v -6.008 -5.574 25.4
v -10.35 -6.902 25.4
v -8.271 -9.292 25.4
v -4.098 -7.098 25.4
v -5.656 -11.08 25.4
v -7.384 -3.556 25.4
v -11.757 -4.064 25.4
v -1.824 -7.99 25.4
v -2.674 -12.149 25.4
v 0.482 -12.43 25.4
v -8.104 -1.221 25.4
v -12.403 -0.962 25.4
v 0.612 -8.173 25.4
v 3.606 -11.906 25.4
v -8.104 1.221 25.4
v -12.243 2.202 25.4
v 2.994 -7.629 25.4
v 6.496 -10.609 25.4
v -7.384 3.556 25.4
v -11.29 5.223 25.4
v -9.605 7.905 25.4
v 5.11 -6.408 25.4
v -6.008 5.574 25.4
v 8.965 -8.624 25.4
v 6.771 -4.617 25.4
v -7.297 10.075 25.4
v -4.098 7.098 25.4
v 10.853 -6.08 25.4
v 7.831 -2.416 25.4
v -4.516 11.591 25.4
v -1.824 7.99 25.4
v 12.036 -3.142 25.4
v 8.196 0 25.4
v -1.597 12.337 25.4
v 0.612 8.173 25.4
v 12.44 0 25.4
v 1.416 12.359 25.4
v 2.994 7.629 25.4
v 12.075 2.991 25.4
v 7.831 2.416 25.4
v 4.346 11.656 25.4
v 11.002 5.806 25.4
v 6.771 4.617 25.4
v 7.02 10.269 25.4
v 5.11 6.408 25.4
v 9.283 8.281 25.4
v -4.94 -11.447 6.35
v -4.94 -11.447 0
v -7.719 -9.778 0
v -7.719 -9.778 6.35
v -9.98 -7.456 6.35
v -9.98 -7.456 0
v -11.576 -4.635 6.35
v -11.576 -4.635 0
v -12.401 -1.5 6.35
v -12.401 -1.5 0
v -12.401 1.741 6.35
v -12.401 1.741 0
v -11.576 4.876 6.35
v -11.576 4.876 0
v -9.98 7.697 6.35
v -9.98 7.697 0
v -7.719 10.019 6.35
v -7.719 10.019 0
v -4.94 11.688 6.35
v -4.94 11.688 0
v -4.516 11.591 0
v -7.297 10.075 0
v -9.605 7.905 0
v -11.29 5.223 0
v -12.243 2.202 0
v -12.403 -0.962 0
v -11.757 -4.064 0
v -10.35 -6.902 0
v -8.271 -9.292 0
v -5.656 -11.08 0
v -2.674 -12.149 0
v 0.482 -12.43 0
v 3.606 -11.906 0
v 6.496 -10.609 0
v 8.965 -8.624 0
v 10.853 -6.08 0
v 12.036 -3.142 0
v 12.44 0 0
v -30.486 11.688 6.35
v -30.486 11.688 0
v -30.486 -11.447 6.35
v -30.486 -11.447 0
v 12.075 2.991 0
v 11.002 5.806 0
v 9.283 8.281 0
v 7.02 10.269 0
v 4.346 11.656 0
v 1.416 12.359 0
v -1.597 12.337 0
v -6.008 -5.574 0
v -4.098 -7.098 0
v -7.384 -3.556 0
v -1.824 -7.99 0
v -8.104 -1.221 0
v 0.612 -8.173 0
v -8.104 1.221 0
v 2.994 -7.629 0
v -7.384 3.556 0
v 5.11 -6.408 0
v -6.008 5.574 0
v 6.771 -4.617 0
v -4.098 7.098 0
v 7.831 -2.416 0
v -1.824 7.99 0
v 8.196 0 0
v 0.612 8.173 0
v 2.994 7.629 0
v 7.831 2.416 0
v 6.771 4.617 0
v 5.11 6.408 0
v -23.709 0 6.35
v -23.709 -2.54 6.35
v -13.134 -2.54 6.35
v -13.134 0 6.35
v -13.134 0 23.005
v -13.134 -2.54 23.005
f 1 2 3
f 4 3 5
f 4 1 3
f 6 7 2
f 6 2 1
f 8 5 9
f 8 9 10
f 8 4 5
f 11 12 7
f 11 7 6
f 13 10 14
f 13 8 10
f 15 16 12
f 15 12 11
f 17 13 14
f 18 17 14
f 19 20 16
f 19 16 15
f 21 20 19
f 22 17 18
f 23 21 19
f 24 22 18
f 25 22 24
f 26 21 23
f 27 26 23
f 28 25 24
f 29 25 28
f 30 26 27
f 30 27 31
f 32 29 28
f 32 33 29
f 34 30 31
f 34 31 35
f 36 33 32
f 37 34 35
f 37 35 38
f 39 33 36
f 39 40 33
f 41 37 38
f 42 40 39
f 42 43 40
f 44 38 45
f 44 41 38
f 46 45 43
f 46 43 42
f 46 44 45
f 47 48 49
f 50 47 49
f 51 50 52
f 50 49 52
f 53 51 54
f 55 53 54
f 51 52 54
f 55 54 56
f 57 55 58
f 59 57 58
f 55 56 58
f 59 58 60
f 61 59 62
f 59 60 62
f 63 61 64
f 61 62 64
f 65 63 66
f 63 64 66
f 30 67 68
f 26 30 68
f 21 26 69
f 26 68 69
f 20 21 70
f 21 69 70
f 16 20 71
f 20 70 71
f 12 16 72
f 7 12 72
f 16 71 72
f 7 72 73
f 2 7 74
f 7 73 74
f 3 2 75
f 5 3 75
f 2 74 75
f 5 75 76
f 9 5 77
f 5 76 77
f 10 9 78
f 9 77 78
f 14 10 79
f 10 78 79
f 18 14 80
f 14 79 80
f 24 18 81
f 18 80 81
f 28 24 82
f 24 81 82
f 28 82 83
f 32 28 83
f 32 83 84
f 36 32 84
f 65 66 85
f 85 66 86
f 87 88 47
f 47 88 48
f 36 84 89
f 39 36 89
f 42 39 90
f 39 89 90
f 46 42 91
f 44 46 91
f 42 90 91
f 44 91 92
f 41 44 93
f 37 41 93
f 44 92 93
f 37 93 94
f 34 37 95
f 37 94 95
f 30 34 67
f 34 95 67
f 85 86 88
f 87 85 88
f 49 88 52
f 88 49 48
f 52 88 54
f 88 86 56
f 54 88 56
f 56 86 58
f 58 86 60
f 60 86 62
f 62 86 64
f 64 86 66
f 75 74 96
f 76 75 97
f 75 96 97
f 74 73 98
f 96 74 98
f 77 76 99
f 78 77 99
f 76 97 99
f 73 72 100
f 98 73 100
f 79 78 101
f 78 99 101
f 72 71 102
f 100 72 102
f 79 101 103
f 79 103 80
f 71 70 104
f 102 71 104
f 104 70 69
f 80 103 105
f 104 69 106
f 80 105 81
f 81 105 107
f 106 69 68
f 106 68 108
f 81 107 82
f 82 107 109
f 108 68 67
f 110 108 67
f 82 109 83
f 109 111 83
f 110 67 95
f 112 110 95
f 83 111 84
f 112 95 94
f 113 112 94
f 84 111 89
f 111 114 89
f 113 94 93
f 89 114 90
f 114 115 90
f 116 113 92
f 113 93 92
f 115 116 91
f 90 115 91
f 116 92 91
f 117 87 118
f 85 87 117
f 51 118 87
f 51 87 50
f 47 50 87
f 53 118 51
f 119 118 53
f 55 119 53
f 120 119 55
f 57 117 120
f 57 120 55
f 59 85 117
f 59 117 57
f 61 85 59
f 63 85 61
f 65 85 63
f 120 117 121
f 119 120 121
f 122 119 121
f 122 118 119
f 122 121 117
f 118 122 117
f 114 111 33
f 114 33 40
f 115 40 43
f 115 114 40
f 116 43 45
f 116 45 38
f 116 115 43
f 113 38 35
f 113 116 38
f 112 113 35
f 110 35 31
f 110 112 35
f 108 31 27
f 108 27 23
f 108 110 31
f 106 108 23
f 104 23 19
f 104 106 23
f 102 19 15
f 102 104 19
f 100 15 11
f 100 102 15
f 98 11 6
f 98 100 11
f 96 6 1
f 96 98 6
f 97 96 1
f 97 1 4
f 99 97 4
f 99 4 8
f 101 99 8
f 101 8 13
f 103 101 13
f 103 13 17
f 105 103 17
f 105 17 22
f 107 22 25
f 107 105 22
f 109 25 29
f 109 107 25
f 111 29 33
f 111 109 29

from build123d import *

# Parameters (mm, degrees)
F0_R     = 8.195567
F1_DEPTH = 25.4
F3_DEPTH = 6.35
F5_DEPTH = 2.54


with BuildPart() as f1:
    # F0 (on Top) → F1 (new body)
    with BuildSketch(Plane.XY):
        with BuildLine():
            ThreePointArc((-4.515771, 11.591242), (-7.02046, -10.26948), (12.439818, 0))
            ThreePointArc((12.439818, 0), (7.02046, 10.26948), (-4.515771, 11.591242))
        make_face()
        Circle(F0_R, mode=Mode.SUBTRACT)
    extrude(amount=F1_DEPTH)


with BuildPart() as f3:
    # F2 (on Top) → F3 (new body)
    with BuildSketch(Plane.XY):
        with BuildLine():
            ThreePointArc((-4.940377, -11.447215), (-12.505839, 0.120497), (-4.940377, 11.688208))
            Line((-4.940377, 11.688208), (-30.485738, 11.688208))
            Line((-30.485738, 11.688208), (-30.485738, -11.447215))
            Line((-30.485738, -11.447215), (-4.940377, -11.447215))
        make_face()
    extrude(amount=F3_DEPTH)

    # F4 (on Front) → F5 (join)
    with BuildSketch(Plane.XZ):
        Polygon((-13.134171, 23.005143), (-23.737907, 6.305113), (-13.134171, 6.305113), align=None)
    extrude(amount=F5_DEPTH)


solid = Compound([f1.part, f3.part])
